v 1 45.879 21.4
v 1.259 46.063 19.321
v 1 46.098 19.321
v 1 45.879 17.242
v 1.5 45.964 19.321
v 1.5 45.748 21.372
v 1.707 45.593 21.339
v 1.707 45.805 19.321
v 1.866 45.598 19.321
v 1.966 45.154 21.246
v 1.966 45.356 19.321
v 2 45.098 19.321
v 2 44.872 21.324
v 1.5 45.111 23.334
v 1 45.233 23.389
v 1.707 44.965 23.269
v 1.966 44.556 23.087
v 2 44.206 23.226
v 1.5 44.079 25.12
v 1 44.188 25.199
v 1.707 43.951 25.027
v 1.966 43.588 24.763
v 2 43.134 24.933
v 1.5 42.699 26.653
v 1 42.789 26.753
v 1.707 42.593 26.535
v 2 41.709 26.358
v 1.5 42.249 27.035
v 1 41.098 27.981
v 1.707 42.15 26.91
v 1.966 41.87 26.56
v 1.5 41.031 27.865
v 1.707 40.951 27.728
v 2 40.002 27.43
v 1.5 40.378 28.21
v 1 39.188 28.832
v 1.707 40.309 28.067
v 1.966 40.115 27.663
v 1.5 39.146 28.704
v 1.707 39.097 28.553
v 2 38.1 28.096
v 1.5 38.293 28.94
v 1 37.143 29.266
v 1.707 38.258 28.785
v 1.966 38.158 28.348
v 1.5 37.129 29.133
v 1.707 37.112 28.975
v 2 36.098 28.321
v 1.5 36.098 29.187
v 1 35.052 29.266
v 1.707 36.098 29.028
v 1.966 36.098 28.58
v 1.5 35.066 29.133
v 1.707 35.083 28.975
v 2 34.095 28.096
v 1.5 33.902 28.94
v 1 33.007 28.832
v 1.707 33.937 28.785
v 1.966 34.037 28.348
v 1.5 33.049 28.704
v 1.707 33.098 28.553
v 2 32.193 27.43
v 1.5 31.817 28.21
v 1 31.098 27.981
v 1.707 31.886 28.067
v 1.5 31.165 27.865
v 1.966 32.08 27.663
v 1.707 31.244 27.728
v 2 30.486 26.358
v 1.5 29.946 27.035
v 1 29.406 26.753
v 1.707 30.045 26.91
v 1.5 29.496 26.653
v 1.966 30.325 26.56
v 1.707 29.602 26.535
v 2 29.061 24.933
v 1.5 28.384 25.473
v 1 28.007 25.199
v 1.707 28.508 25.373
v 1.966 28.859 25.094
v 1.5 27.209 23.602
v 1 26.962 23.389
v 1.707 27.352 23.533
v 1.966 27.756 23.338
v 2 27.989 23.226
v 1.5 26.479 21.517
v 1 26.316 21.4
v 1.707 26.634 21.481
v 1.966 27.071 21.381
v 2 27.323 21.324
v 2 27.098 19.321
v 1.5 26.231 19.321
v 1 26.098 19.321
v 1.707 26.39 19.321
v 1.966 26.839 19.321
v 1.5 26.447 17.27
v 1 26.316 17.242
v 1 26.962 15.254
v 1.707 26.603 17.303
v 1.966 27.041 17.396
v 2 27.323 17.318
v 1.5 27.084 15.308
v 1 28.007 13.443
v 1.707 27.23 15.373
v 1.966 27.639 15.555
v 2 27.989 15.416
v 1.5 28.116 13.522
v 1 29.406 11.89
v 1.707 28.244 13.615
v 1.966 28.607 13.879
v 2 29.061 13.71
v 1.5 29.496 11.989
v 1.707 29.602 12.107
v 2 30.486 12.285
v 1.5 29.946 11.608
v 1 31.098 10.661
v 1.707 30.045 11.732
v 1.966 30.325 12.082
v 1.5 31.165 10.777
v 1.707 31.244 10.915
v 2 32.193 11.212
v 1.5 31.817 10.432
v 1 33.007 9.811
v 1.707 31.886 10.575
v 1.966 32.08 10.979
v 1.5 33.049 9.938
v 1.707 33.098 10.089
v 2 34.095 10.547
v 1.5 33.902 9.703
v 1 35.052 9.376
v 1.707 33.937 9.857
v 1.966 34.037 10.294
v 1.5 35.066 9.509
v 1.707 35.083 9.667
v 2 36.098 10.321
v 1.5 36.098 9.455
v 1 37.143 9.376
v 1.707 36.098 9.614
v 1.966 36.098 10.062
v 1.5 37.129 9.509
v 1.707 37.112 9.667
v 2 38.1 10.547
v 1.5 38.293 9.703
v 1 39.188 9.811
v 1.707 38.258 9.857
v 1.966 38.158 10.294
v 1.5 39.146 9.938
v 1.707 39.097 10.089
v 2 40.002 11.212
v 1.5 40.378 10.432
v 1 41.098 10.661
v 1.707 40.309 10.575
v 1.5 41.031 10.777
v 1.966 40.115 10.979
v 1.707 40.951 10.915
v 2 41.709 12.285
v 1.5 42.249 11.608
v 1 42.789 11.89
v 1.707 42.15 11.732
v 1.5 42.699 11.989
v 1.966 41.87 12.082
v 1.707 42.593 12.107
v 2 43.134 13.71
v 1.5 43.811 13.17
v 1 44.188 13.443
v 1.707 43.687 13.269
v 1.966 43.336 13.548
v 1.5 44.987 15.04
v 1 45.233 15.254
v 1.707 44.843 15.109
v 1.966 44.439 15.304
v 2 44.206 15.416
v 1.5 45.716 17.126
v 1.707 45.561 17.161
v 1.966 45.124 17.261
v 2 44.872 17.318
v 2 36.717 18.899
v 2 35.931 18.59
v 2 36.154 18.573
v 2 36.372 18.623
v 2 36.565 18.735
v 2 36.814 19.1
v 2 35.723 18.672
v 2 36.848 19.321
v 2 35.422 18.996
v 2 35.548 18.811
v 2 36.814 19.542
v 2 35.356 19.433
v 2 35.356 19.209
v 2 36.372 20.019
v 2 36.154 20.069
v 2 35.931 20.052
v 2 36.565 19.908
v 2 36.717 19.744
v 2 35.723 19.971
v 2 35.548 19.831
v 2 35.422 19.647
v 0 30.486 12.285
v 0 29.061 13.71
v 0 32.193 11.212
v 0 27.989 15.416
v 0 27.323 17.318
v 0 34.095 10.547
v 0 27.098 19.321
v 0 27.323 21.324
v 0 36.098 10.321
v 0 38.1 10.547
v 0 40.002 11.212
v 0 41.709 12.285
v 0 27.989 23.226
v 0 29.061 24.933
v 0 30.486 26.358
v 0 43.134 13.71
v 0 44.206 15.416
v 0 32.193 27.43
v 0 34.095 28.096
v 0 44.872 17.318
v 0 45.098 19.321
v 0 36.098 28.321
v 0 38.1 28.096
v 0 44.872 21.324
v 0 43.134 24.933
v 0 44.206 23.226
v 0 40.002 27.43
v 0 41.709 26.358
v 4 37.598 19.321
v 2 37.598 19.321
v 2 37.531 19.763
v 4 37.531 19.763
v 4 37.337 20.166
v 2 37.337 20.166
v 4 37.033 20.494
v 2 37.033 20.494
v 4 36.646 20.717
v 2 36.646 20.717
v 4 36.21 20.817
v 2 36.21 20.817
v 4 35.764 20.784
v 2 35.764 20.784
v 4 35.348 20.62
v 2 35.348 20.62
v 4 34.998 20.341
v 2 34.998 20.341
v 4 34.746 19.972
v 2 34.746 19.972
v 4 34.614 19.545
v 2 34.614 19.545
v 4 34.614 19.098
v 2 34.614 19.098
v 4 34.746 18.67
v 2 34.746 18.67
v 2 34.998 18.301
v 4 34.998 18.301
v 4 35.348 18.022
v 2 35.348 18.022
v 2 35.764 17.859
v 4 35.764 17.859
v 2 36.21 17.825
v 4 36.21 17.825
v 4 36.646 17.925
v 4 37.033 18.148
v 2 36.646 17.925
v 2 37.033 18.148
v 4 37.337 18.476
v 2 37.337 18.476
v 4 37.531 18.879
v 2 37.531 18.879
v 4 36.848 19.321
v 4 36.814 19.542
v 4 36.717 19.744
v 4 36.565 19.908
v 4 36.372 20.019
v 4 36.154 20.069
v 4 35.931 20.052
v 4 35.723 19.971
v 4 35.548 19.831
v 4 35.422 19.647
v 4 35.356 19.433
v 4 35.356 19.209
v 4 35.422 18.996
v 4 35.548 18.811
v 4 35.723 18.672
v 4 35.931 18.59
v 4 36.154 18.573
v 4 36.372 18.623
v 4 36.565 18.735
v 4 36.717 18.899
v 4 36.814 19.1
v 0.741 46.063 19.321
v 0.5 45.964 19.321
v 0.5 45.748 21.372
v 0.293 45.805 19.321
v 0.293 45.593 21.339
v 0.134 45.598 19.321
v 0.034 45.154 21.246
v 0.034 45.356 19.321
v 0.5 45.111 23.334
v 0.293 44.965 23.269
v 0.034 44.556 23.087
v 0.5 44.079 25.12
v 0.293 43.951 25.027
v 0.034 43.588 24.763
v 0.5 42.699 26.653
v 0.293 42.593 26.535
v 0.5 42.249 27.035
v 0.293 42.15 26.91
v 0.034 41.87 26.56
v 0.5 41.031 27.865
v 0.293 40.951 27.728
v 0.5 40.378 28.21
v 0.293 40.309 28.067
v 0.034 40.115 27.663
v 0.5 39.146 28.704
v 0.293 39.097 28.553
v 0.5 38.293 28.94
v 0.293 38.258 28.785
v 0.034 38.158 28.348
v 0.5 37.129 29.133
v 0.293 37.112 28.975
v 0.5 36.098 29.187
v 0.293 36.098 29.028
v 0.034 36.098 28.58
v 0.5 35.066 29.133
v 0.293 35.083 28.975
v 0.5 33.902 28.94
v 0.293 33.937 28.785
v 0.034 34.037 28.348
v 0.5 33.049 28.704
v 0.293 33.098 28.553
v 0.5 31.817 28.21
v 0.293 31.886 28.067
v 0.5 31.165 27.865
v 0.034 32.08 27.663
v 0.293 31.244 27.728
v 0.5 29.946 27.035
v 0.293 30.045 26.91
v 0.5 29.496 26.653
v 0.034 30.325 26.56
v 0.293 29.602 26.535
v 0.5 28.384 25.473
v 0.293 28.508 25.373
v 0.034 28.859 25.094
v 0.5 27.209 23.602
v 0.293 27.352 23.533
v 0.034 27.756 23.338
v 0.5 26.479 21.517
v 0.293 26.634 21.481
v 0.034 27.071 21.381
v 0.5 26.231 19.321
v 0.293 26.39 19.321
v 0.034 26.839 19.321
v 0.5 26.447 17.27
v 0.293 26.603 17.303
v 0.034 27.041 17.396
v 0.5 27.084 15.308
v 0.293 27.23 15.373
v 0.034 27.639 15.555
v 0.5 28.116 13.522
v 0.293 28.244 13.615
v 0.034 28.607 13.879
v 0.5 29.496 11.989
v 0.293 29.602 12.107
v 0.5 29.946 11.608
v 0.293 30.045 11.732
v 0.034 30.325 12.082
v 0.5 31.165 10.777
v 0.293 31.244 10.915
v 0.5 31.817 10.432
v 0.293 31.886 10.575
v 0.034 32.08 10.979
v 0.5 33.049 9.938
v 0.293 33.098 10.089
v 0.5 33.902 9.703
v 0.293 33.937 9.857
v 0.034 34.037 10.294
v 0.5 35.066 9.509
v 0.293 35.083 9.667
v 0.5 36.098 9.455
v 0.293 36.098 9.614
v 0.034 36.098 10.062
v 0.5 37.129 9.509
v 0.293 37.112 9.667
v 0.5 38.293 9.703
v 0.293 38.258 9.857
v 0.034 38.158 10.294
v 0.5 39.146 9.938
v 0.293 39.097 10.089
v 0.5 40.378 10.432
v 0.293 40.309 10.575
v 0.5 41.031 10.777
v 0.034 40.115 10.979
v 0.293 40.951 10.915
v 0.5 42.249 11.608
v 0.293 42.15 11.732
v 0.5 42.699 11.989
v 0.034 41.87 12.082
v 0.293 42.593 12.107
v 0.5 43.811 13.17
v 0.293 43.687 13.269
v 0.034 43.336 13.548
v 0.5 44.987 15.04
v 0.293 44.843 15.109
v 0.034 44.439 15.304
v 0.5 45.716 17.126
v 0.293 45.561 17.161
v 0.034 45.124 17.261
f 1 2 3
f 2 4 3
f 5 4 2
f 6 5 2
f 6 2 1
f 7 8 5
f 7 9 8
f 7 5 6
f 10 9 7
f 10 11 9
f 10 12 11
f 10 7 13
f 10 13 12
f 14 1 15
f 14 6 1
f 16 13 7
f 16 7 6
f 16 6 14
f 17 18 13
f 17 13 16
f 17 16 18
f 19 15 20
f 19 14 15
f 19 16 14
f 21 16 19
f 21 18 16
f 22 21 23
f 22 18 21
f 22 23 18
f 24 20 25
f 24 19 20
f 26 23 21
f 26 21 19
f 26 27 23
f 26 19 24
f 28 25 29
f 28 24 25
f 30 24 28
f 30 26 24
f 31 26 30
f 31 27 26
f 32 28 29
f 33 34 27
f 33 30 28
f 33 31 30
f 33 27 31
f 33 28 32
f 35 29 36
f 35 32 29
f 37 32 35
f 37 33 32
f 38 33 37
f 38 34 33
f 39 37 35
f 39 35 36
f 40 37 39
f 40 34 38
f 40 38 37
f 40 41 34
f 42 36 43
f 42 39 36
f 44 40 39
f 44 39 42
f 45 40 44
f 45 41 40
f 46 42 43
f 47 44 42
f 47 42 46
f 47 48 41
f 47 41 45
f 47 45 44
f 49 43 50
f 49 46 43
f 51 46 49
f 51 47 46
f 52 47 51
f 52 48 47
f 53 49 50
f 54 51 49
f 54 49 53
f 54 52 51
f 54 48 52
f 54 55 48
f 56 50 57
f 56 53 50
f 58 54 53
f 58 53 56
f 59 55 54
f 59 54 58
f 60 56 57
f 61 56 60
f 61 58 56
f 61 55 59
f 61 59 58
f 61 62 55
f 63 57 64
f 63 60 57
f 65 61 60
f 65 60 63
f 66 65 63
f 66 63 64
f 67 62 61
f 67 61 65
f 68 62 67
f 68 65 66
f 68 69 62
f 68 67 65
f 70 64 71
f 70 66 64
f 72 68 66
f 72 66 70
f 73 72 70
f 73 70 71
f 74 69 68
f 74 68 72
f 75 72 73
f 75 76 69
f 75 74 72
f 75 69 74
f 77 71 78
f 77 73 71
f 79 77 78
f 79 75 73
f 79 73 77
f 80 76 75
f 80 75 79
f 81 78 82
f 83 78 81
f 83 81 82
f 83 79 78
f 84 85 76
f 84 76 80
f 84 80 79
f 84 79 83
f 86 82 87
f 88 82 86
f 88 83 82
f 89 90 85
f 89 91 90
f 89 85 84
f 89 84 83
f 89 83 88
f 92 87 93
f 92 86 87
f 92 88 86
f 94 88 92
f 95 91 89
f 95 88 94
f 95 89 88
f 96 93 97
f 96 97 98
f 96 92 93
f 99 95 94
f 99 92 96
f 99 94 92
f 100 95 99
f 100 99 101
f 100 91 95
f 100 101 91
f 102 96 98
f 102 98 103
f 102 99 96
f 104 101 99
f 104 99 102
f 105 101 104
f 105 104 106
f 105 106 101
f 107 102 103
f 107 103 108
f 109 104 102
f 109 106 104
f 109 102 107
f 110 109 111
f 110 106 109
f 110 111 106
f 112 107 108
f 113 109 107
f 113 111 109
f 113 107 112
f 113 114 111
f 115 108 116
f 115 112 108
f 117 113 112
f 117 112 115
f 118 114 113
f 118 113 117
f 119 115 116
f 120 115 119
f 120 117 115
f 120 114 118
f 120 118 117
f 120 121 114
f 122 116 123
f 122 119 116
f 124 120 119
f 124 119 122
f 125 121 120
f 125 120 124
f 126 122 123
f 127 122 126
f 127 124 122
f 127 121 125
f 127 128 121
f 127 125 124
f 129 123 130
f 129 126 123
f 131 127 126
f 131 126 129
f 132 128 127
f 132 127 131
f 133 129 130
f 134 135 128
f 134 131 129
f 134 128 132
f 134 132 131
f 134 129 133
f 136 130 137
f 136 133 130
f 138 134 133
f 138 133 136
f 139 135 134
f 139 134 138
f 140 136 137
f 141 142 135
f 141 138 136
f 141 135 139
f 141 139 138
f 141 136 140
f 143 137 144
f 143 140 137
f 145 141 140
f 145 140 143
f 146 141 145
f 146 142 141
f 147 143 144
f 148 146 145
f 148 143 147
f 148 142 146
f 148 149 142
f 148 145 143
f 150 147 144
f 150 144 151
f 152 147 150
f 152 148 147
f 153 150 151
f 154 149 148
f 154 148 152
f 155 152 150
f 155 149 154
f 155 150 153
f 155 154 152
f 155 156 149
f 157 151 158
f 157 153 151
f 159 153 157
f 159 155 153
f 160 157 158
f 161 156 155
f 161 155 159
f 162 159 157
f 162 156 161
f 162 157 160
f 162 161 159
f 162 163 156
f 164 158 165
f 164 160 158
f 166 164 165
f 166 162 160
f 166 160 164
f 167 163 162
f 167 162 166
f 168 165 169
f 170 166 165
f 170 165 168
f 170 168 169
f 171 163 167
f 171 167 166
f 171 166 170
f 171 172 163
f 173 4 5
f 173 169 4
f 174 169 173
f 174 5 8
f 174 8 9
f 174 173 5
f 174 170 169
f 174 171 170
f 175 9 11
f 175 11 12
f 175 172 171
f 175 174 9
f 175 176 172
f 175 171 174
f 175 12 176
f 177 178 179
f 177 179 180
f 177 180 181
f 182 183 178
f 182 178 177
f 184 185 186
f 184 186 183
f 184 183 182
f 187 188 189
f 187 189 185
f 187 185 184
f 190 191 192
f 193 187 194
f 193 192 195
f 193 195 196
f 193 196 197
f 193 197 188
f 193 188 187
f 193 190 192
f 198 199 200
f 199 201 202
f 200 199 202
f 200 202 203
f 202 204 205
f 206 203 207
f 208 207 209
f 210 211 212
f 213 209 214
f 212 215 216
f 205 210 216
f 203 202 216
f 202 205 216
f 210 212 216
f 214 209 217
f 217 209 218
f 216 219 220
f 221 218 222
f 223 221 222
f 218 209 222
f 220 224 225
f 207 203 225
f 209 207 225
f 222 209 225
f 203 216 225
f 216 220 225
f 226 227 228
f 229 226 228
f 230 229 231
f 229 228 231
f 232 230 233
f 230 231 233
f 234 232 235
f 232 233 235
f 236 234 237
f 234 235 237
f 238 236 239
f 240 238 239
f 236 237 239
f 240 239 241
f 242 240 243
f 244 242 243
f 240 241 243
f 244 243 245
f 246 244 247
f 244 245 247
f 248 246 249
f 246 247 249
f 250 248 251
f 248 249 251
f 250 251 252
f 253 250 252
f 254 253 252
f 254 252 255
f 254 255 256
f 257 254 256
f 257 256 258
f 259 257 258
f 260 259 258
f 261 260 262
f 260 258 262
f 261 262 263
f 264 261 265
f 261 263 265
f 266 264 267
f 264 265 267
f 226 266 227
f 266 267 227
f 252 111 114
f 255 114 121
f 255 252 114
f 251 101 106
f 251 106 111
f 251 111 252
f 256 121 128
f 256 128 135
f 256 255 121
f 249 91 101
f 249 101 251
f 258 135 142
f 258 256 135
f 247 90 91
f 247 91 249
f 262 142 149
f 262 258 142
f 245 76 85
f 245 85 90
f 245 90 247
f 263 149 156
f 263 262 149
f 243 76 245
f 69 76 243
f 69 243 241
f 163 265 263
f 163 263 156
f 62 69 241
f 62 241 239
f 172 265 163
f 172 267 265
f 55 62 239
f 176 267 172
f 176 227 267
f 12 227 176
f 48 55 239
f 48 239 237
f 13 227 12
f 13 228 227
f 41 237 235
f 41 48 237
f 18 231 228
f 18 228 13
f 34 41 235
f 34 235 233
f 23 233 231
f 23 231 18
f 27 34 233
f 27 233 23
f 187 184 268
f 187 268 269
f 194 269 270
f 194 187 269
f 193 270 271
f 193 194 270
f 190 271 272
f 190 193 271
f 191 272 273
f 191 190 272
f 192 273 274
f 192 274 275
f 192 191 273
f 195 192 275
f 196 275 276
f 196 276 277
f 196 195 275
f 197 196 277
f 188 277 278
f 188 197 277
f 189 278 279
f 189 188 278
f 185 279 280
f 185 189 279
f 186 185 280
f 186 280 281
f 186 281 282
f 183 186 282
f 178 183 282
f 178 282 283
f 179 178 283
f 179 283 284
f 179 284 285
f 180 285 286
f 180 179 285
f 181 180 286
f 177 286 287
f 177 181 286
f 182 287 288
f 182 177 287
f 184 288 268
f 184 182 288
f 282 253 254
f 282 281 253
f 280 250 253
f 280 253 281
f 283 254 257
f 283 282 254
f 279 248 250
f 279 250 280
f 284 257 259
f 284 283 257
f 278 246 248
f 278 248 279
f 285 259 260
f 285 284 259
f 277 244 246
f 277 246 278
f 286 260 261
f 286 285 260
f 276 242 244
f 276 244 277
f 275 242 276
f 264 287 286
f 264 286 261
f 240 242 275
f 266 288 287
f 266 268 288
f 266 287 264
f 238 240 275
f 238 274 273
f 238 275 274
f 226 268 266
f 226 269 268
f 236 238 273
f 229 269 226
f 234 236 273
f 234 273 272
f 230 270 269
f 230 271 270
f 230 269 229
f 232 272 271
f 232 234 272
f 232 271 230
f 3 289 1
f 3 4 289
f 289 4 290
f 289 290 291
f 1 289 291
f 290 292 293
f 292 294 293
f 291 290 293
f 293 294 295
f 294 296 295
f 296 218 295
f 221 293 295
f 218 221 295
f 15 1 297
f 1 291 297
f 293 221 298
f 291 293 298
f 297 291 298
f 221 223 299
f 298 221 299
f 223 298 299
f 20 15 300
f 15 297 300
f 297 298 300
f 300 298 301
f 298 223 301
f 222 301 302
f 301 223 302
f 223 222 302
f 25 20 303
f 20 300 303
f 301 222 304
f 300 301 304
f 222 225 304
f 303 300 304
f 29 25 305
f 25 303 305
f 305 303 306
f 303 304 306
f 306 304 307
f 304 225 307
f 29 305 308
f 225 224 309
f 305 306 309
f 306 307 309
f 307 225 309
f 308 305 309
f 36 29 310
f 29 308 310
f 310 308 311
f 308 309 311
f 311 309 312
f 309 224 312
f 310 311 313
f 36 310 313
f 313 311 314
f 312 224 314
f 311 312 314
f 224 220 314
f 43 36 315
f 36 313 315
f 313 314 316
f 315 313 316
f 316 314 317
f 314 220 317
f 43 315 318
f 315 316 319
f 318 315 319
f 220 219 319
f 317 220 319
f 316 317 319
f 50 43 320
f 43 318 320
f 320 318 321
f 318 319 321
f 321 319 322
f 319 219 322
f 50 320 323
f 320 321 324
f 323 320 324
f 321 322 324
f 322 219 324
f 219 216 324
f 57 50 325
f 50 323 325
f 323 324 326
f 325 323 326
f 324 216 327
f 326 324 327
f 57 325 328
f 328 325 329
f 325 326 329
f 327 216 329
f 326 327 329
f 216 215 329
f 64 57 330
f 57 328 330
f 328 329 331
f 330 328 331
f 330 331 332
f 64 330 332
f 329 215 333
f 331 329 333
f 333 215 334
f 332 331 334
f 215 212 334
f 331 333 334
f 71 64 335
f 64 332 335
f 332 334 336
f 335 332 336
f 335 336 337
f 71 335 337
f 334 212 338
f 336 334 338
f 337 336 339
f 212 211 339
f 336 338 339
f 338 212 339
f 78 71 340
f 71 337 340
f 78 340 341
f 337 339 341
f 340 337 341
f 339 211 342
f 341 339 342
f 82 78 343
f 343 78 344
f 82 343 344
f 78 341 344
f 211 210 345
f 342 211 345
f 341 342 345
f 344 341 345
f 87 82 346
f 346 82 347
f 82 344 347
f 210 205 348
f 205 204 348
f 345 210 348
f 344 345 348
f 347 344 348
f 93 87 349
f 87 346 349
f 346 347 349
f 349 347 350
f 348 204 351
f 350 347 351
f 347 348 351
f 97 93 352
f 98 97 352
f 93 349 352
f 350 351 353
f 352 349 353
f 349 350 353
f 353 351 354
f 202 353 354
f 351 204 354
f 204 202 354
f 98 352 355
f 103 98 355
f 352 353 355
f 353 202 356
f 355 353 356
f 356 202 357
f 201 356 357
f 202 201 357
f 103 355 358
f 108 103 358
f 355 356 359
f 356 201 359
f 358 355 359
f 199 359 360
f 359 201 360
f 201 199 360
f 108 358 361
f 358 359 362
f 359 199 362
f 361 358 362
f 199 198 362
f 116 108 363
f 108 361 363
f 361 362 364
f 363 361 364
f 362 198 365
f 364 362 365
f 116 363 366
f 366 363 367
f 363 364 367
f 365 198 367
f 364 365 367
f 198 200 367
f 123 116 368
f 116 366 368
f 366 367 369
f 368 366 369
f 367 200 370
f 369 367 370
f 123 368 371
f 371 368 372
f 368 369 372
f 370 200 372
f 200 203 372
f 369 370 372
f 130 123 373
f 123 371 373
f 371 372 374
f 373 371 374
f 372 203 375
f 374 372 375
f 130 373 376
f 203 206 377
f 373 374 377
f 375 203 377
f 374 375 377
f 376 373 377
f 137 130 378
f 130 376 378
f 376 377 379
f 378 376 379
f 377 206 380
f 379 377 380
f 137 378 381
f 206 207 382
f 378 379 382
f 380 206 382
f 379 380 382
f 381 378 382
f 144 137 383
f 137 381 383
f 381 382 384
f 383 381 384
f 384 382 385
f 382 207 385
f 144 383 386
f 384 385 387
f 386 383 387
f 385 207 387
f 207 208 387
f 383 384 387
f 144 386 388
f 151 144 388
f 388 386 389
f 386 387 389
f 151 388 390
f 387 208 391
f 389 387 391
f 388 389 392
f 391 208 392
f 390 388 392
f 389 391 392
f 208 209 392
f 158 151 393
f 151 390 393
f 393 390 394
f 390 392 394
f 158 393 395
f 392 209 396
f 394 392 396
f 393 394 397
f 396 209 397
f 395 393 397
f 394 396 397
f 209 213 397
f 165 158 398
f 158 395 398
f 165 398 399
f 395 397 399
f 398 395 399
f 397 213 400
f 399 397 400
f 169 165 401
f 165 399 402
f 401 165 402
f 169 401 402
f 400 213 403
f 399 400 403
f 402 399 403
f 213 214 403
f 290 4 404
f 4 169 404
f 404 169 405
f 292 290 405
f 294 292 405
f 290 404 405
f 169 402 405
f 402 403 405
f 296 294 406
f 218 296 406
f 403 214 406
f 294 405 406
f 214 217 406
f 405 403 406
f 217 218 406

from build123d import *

# Parameters (mm, degrees)
F0_R     = 10
F1_DEPTH = 2
F2_R     = 1.5
F2_R_2   = 0.75
F3_DEPTH = 2
F4_R     = 0.99999


# Not quite as in the source:
# - a fillet or chamfer is up to 0.001 mm smaller than in the source, because OpenCascade refuses the exact size


with BuildPart() as f1:
    # F0 (on Right) → F1 (new body)
    with BuildSketch(Plane.YZ):
        with Locations((36.0975265503, 19.3211734295)):
            Circle(F0_R)
    extrude(amount=F1_DEPTH)

    # F2 (on face) → F3 (join)
    with BuildSketch(Plane.YZ.offset(2)):
        with Locations((36.0975265503, 19.3211734295)):
            Circle(F2_R)
        with Locations((36.0975265503, 19.3211734295)):
            Circle(F2_R_2, mode=Mode.SUBTRACT)
    extrude(amount=F3_DEPTH)

    # F4 (radius 1 in the source; OpenCascade refuses exactly that, so slightly less here)
    f4_edges = [f1.edges().sort_by_distance(p)[0] for p in [
        (2, 26.097527, 19.321173),
        (0, 26.097527, 19.321173),
    ]]
    fillet(f4_edges, radius=F4_R)


solid = f1.part
